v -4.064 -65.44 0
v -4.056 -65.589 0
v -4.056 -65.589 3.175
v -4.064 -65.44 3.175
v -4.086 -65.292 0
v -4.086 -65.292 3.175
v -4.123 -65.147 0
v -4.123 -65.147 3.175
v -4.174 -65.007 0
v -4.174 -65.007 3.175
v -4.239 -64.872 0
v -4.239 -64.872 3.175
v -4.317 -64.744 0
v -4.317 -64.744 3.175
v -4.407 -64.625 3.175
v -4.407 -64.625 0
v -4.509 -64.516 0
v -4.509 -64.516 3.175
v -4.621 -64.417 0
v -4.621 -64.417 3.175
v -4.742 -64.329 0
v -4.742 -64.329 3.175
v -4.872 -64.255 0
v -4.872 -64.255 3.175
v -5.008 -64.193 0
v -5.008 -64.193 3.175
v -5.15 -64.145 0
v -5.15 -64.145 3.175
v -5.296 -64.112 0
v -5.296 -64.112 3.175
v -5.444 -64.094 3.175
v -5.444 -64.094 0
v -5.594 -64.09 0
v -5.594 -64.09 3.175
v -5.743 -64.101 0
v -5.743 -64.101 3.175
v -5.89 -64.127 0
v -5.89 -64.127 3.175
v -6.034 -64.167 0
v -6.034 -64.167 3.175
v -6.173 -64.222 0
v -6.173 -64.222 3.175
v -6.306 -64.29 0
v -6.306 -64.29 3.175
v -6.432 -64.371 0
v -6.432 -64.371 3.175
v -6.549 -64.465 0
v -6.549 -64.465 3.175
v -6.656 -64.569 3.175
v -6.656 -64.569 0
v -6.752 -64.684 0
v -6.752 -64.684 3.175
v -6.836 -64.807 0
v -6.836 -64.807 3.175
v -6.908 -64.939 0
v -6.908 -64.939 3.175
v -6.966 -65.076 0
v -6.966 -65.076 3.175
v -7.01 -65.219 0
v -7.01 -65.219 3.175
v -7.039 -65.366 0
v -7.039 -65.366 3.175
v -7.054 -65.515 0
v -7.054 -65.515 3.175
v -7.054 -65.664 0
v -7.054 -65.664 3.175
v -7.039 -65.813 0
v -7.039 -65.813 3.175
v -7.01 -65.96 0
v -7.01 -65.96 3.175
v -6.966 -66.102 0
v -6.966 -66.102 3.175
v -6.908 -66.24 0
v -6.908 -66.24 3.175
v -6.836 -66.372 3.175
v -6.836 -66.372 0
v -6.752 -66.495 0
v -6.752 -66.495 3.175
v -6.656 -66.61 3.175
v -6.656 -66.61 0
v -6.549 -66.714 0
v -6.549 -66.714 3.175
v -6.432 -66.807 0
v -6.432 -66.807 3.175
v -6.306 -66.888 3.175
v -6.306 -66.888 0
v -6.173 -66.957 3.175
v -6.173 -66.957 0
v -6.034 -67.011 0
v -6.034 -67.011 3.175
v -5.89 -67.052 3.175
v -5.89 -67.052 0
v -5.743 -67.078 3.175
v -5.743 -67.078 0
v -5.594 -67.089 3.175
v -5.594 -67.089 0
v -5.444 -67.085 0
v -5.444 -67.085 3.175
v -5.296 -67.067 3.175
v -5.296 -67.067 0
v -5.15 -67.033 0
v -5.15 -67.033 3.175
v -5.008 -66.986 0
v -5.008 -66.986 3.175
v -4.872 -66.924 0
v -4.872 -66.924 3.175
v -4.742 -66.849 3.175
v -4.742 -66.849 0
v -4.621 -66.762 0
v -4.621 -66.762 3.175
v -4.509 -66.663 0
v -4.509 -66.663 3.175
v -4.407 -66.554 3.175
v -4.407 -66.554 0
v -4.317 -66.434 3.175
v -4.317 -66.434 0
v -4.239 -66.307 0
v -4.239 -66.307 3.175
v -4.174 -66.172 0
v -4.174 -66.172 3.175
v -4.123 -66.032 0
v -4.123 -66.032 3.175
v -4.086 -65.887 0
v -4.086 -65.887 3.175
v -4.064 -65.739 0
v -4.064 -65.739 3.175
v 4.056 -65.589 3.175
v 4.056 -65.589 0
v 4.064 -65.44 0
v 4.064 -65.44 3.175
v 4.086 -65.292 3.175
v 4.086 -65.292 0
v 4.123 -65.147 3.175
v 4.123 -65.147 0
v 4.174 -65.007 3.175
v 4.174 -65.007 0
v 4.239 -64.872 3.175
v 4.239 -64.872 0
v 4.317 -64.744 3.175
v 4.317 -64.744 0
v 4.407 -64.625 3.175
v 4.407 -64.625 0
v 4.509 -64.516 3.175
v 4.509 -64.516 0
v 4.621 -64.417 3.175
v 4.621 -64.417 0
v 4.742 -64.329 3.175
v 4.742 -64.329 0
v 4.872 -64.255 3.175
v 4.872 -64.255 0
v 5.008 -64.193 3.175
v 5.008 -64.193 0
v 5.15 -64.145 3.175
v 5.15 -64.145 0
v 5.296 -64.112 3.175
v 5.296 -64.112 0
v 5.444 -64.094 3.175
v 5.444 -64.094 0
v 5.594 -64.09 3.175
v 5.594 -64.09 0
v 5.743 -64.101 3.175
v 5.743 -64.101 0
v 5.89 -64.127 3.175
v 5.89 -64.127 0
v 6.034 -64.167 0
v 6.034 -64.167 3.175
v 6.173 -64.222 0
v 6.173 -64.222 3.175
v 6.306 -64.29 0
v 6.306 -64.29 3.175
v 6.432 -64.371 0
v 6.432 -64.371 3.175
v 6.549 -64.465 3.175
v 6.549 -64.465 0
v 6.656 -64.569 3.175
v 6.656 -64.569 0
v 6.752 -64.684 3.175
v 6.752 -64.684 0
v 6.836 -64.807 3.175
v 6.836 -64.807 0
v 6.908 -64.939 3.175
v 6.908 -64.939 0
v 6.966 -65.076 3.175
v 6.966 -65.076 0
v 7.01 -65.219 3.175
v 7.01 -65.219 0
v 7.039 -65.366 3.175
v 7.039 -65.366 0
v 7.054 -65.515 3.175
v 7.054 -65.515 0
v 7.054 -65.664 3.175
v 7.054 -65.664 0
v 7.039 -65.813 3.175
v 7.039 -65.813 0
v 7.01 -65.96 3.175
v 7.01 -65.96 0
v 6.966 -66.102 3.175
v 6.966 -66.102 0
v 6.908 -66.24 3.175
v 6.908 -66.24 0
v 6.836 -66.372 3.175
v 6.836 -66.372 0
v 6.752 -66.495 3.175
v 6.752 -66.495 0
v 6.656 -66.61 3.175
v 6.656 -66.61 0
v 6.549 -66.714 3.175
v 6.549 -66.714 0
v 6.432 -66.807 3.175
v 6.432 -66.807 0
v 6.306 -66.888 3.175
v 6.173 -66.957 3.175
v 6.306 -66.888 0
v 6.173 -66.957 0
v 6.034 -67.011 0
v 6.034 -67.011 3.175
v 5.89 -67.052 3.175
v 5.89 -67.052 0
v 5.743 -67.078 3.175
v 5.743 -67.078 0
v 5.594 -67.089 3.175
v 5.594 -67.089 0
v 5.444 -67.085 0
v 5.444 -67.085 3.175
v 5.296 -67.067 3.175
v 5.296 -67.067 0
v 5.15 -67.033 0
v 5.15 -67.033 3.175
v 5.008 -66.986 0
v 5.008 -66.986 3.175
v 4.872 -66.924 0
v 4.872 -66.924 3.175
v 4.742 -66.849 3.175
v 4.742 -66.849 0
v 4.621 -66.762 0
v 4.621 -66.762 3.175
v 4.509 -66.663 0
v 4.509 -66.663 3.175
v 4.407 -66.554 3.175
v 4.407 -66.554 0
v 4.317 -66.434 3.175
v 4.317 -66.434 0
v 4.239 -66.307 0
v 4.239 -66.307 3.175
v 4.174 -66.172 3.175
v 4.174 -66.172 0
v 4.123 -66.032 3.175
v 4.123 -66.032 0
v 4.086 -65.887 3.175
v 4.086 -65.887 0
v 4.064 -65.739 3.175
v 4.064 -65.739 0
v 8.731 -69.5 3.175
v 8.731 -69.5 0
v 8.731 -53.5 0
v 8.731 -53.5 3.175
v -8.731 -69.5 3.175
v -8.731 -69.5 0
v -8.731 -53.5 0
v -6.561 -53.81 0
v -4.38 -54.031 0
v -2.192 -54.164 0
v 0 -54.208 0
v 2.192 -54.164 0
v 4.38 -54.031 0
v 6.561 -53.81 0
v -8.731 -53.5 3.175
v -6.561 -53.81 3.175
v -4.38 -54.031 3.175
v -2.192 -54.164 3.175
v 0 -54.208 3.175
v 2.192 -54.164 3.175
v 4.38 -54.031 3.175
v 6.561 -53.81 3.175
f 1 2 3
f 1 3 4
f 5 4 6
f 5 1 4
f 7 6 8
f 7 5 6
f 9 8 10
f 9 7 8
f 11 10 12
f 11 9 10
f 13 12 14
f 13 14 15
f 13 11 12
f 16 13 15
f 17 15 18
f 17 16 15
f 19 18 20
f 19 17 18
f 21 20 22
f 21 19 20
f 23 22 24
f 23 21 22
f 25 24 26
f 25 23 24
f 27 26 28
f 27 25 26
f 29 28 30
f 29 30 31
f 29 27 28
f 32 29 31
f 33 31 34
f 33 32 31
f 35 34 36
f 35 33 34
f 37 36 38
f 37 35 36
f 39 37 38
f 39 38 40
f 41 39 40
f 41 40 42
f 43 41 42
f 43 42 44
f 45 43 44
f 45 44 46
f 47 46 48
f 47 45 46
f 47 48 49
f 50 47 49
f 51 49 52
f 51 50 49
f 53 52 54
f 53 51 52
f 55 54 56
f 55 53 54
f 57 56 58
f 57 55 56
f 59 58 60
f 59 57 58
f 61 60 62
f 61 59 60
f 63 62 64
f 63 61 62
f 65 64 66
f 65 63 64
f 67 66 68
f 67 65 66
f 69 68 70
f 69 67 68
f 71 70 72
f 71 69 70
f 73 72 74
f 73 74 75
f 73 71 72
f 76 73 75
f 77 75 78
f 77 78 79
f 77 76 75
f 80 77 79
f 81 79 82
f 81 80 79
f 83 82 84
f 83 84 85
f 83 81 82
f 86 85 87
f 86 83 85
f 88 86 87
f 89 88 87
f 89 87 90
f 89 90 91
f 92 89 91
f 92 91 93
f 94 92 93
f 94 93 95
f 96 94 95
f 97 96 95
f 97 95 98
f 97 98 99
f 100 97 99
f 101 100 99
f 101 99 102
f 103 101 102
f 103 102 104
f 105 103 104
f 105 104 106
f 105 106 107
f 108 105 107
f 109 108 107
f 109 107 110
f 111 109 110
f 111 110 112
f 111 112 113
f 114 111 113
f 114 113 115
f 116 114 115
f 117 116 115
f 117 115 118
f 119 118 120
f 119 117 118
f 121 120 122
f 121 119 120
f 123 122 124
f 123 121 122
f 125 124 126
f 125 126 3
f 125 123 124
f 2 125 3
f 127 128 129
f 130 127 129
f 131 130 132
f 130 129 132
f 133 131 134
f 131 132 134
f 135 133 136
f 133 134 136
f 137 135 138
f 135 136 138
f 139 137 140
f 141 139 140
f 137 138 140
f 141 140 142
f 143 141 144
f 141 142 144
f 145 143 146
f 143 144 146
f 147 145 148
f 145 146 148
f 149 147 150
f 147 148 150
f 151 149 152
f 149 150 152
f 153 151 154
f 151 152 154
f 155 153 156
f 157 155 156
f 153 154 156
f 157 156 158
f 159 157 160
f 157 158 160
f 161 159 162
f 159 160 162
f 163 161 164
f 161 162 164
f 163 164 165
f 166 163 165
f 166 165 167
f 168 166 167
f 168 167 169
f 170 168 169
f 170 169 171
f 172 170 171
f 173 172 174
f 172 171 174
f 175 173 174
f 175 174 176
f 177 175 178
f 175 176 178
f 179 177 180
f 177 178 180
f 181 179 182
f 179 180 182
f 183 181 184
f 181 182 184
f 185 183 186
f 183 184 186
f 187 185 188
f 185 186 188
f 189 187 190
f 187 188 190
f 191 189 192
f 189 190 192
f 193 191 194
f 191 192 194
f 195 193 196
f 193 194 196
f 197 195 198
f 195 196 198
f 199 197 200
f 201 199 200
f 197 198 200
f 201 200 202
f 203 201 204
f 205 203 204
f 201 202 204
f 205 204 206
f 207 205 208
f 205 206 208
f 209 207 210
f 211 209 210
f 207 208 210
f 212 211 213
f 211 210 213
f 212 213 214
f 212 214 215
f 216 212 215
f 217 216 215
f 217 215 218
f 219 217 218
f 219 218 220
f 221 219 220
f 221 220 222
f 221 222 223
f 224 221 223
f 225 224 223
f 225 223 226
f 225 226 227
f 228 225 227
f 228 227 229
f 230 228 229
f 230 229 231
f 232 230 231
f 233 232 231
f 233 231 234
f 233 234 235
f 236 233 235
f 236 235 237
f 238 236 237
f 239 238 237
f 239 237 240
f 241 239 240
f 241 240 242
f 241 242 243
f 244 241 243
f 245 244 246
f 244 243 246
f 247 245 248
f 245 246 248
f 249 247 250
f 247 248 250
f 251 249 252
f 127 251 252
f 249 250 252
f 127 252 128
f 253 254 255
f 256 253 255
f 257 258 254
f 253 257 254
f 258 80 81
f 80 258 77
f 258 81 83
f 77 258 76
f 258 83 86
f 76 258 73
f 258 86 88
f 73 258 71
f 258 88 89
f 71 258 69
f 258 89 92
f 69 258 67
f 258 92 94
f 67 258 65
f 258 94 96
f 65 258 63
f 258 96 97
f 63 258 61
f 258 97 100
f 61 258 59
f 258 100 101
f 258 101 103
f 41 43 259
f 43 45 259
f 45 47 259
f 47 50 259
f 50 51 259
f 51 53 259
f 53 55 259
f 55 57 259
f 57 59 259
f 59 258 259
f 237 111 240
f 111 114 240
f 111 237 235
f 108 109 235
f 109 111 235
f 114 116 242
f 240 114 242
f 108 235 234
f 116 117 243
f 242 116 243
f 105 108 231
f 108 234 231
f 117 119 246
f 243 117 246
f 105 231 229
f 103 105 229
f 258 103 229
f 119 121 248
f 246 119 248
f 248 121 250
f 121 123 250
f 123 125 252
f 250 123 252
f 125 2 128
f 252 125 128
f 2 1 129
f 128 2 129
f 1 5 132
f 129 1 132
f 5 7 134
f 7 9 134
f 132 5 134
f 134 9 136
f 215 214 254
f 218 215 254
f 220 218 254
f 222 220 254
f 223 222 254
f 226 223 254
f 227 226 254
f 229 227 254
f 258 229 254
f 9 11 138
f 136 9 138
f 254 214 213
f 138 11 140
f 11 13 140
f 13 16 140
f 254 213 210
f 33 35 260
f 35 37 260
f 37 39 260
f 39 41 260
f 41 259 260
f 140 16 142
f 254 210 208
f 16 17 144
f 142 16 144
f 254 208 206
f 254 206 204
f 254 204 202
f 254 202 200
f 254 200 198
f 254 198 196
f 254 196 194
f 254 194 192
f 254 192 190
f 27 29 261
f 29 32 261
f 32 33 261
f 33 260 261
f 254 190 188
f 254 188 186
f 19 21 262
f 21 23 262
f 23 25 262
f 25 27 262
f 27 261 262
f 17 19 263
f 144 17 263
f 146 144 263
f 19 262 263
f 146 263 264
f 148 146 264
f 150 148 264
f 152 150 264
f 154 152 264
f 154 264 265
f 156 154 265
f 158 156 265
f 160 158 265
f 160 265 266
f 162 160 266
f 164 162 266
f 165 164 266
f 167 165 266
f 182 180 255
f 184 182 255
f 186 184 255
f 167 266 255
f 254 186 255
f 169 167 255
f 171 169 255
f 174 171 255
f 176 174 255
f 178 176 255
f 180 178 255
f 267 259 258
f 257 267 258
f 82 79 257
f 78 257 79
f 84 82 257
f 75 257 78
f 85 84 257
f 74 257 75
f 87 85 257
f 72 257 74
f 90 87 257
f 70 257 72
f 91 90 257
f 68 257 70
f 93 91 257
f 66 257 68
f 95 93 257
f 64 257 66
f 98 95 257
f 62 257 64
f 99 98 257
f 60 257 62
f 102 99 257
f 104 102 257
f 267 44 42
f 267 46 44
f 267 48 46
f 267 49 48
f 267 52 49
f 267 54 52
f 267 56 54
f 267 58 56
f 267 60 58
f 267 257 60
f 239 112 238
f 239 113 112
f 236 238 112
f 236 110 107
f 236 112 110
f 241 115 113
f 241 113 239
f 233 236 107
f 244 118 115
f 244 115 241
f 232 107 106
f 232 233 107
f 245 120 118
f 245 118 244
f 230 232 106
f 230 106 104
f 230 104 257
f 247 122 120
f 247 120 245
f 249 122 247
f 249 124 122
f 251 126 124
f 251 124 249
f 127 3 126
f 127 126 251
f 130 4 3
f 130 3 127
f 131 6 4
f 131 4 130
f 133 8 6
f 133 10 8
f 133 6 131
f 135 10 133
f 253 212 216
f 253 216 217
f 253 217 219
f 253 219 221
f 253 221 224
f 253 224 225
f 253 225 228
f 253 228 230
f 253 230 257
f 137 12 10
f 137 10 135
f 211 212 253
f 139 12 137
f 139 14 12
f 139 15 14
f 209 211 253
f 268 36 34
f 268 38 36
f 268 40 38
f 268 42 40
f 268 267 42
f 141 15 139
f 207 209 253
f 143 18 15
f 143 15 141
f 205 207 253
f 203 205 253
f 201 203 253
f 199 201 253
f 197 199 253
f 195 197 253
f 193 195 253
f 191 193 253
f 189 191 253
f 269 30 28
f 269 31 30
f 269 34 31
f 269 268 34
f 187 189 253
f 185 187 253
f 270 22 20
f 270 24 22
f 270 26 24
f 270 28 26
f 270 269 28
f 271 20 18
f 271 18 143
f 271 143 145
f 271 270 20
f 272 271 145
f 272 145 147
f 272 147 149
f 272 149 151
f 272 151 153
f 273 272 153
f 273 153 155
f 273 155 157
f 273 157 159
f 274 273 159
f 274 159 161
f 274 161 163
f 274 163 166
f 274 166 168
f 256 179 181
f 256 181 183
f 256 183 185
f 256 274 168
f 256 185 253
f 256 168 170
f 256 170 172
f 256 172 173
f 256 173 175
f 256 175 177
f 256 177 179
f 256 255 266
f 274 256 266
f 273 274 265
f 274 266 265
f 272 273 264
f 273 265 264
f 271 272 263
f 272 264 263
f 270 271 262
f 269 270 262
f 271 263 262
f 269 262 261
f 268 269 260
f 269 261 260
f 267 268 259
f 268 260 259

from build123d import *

# Parameters (mm, degrees)
SKETCH1_R           = 1.5
BOSS_EXTRUDE1_DEPTH = 3.175


with BuildPart() as part:
    # Sketch1 → Boss-Extrude1 (new body)
    with BuildSketch(Plane.XY):
        with BuildLine():
            Line((-8.73125, -69.500247016), (0, -69.500247016))
            Line((0, -69.500247016), (8.73125, -69.500247016))
            Line((8.73125, -69.500247016), (8.73125, -53.500247016))
            ThreePointArc((8.73125, -53.500247016), (0, -54.208035911), (-8.73125, -53.500247016))
            Line((-8.73125, -53.500247016), (-8.73125, -69.500247016))
        make_face()
        with Locations((-5.55625, -65.589370266)):
            Circle(SKETCH1_R, mode=Mode.SUBTRACT)
        with BuildLine():
            ThreePointArc((7.05625, -65.589370266), (5.55625, -67.089370266), (4.05625, -65.589370266))
            ThreePointArc((4.05625, -65.589370266), (5.55625, -64.089370266), (7.05625, -65.589370266))
        make_face(mode=Mode.SUBTRACT)
    extrude(amount=BOSS_EXTRUDE1_DEPTH)


solid = part.part
